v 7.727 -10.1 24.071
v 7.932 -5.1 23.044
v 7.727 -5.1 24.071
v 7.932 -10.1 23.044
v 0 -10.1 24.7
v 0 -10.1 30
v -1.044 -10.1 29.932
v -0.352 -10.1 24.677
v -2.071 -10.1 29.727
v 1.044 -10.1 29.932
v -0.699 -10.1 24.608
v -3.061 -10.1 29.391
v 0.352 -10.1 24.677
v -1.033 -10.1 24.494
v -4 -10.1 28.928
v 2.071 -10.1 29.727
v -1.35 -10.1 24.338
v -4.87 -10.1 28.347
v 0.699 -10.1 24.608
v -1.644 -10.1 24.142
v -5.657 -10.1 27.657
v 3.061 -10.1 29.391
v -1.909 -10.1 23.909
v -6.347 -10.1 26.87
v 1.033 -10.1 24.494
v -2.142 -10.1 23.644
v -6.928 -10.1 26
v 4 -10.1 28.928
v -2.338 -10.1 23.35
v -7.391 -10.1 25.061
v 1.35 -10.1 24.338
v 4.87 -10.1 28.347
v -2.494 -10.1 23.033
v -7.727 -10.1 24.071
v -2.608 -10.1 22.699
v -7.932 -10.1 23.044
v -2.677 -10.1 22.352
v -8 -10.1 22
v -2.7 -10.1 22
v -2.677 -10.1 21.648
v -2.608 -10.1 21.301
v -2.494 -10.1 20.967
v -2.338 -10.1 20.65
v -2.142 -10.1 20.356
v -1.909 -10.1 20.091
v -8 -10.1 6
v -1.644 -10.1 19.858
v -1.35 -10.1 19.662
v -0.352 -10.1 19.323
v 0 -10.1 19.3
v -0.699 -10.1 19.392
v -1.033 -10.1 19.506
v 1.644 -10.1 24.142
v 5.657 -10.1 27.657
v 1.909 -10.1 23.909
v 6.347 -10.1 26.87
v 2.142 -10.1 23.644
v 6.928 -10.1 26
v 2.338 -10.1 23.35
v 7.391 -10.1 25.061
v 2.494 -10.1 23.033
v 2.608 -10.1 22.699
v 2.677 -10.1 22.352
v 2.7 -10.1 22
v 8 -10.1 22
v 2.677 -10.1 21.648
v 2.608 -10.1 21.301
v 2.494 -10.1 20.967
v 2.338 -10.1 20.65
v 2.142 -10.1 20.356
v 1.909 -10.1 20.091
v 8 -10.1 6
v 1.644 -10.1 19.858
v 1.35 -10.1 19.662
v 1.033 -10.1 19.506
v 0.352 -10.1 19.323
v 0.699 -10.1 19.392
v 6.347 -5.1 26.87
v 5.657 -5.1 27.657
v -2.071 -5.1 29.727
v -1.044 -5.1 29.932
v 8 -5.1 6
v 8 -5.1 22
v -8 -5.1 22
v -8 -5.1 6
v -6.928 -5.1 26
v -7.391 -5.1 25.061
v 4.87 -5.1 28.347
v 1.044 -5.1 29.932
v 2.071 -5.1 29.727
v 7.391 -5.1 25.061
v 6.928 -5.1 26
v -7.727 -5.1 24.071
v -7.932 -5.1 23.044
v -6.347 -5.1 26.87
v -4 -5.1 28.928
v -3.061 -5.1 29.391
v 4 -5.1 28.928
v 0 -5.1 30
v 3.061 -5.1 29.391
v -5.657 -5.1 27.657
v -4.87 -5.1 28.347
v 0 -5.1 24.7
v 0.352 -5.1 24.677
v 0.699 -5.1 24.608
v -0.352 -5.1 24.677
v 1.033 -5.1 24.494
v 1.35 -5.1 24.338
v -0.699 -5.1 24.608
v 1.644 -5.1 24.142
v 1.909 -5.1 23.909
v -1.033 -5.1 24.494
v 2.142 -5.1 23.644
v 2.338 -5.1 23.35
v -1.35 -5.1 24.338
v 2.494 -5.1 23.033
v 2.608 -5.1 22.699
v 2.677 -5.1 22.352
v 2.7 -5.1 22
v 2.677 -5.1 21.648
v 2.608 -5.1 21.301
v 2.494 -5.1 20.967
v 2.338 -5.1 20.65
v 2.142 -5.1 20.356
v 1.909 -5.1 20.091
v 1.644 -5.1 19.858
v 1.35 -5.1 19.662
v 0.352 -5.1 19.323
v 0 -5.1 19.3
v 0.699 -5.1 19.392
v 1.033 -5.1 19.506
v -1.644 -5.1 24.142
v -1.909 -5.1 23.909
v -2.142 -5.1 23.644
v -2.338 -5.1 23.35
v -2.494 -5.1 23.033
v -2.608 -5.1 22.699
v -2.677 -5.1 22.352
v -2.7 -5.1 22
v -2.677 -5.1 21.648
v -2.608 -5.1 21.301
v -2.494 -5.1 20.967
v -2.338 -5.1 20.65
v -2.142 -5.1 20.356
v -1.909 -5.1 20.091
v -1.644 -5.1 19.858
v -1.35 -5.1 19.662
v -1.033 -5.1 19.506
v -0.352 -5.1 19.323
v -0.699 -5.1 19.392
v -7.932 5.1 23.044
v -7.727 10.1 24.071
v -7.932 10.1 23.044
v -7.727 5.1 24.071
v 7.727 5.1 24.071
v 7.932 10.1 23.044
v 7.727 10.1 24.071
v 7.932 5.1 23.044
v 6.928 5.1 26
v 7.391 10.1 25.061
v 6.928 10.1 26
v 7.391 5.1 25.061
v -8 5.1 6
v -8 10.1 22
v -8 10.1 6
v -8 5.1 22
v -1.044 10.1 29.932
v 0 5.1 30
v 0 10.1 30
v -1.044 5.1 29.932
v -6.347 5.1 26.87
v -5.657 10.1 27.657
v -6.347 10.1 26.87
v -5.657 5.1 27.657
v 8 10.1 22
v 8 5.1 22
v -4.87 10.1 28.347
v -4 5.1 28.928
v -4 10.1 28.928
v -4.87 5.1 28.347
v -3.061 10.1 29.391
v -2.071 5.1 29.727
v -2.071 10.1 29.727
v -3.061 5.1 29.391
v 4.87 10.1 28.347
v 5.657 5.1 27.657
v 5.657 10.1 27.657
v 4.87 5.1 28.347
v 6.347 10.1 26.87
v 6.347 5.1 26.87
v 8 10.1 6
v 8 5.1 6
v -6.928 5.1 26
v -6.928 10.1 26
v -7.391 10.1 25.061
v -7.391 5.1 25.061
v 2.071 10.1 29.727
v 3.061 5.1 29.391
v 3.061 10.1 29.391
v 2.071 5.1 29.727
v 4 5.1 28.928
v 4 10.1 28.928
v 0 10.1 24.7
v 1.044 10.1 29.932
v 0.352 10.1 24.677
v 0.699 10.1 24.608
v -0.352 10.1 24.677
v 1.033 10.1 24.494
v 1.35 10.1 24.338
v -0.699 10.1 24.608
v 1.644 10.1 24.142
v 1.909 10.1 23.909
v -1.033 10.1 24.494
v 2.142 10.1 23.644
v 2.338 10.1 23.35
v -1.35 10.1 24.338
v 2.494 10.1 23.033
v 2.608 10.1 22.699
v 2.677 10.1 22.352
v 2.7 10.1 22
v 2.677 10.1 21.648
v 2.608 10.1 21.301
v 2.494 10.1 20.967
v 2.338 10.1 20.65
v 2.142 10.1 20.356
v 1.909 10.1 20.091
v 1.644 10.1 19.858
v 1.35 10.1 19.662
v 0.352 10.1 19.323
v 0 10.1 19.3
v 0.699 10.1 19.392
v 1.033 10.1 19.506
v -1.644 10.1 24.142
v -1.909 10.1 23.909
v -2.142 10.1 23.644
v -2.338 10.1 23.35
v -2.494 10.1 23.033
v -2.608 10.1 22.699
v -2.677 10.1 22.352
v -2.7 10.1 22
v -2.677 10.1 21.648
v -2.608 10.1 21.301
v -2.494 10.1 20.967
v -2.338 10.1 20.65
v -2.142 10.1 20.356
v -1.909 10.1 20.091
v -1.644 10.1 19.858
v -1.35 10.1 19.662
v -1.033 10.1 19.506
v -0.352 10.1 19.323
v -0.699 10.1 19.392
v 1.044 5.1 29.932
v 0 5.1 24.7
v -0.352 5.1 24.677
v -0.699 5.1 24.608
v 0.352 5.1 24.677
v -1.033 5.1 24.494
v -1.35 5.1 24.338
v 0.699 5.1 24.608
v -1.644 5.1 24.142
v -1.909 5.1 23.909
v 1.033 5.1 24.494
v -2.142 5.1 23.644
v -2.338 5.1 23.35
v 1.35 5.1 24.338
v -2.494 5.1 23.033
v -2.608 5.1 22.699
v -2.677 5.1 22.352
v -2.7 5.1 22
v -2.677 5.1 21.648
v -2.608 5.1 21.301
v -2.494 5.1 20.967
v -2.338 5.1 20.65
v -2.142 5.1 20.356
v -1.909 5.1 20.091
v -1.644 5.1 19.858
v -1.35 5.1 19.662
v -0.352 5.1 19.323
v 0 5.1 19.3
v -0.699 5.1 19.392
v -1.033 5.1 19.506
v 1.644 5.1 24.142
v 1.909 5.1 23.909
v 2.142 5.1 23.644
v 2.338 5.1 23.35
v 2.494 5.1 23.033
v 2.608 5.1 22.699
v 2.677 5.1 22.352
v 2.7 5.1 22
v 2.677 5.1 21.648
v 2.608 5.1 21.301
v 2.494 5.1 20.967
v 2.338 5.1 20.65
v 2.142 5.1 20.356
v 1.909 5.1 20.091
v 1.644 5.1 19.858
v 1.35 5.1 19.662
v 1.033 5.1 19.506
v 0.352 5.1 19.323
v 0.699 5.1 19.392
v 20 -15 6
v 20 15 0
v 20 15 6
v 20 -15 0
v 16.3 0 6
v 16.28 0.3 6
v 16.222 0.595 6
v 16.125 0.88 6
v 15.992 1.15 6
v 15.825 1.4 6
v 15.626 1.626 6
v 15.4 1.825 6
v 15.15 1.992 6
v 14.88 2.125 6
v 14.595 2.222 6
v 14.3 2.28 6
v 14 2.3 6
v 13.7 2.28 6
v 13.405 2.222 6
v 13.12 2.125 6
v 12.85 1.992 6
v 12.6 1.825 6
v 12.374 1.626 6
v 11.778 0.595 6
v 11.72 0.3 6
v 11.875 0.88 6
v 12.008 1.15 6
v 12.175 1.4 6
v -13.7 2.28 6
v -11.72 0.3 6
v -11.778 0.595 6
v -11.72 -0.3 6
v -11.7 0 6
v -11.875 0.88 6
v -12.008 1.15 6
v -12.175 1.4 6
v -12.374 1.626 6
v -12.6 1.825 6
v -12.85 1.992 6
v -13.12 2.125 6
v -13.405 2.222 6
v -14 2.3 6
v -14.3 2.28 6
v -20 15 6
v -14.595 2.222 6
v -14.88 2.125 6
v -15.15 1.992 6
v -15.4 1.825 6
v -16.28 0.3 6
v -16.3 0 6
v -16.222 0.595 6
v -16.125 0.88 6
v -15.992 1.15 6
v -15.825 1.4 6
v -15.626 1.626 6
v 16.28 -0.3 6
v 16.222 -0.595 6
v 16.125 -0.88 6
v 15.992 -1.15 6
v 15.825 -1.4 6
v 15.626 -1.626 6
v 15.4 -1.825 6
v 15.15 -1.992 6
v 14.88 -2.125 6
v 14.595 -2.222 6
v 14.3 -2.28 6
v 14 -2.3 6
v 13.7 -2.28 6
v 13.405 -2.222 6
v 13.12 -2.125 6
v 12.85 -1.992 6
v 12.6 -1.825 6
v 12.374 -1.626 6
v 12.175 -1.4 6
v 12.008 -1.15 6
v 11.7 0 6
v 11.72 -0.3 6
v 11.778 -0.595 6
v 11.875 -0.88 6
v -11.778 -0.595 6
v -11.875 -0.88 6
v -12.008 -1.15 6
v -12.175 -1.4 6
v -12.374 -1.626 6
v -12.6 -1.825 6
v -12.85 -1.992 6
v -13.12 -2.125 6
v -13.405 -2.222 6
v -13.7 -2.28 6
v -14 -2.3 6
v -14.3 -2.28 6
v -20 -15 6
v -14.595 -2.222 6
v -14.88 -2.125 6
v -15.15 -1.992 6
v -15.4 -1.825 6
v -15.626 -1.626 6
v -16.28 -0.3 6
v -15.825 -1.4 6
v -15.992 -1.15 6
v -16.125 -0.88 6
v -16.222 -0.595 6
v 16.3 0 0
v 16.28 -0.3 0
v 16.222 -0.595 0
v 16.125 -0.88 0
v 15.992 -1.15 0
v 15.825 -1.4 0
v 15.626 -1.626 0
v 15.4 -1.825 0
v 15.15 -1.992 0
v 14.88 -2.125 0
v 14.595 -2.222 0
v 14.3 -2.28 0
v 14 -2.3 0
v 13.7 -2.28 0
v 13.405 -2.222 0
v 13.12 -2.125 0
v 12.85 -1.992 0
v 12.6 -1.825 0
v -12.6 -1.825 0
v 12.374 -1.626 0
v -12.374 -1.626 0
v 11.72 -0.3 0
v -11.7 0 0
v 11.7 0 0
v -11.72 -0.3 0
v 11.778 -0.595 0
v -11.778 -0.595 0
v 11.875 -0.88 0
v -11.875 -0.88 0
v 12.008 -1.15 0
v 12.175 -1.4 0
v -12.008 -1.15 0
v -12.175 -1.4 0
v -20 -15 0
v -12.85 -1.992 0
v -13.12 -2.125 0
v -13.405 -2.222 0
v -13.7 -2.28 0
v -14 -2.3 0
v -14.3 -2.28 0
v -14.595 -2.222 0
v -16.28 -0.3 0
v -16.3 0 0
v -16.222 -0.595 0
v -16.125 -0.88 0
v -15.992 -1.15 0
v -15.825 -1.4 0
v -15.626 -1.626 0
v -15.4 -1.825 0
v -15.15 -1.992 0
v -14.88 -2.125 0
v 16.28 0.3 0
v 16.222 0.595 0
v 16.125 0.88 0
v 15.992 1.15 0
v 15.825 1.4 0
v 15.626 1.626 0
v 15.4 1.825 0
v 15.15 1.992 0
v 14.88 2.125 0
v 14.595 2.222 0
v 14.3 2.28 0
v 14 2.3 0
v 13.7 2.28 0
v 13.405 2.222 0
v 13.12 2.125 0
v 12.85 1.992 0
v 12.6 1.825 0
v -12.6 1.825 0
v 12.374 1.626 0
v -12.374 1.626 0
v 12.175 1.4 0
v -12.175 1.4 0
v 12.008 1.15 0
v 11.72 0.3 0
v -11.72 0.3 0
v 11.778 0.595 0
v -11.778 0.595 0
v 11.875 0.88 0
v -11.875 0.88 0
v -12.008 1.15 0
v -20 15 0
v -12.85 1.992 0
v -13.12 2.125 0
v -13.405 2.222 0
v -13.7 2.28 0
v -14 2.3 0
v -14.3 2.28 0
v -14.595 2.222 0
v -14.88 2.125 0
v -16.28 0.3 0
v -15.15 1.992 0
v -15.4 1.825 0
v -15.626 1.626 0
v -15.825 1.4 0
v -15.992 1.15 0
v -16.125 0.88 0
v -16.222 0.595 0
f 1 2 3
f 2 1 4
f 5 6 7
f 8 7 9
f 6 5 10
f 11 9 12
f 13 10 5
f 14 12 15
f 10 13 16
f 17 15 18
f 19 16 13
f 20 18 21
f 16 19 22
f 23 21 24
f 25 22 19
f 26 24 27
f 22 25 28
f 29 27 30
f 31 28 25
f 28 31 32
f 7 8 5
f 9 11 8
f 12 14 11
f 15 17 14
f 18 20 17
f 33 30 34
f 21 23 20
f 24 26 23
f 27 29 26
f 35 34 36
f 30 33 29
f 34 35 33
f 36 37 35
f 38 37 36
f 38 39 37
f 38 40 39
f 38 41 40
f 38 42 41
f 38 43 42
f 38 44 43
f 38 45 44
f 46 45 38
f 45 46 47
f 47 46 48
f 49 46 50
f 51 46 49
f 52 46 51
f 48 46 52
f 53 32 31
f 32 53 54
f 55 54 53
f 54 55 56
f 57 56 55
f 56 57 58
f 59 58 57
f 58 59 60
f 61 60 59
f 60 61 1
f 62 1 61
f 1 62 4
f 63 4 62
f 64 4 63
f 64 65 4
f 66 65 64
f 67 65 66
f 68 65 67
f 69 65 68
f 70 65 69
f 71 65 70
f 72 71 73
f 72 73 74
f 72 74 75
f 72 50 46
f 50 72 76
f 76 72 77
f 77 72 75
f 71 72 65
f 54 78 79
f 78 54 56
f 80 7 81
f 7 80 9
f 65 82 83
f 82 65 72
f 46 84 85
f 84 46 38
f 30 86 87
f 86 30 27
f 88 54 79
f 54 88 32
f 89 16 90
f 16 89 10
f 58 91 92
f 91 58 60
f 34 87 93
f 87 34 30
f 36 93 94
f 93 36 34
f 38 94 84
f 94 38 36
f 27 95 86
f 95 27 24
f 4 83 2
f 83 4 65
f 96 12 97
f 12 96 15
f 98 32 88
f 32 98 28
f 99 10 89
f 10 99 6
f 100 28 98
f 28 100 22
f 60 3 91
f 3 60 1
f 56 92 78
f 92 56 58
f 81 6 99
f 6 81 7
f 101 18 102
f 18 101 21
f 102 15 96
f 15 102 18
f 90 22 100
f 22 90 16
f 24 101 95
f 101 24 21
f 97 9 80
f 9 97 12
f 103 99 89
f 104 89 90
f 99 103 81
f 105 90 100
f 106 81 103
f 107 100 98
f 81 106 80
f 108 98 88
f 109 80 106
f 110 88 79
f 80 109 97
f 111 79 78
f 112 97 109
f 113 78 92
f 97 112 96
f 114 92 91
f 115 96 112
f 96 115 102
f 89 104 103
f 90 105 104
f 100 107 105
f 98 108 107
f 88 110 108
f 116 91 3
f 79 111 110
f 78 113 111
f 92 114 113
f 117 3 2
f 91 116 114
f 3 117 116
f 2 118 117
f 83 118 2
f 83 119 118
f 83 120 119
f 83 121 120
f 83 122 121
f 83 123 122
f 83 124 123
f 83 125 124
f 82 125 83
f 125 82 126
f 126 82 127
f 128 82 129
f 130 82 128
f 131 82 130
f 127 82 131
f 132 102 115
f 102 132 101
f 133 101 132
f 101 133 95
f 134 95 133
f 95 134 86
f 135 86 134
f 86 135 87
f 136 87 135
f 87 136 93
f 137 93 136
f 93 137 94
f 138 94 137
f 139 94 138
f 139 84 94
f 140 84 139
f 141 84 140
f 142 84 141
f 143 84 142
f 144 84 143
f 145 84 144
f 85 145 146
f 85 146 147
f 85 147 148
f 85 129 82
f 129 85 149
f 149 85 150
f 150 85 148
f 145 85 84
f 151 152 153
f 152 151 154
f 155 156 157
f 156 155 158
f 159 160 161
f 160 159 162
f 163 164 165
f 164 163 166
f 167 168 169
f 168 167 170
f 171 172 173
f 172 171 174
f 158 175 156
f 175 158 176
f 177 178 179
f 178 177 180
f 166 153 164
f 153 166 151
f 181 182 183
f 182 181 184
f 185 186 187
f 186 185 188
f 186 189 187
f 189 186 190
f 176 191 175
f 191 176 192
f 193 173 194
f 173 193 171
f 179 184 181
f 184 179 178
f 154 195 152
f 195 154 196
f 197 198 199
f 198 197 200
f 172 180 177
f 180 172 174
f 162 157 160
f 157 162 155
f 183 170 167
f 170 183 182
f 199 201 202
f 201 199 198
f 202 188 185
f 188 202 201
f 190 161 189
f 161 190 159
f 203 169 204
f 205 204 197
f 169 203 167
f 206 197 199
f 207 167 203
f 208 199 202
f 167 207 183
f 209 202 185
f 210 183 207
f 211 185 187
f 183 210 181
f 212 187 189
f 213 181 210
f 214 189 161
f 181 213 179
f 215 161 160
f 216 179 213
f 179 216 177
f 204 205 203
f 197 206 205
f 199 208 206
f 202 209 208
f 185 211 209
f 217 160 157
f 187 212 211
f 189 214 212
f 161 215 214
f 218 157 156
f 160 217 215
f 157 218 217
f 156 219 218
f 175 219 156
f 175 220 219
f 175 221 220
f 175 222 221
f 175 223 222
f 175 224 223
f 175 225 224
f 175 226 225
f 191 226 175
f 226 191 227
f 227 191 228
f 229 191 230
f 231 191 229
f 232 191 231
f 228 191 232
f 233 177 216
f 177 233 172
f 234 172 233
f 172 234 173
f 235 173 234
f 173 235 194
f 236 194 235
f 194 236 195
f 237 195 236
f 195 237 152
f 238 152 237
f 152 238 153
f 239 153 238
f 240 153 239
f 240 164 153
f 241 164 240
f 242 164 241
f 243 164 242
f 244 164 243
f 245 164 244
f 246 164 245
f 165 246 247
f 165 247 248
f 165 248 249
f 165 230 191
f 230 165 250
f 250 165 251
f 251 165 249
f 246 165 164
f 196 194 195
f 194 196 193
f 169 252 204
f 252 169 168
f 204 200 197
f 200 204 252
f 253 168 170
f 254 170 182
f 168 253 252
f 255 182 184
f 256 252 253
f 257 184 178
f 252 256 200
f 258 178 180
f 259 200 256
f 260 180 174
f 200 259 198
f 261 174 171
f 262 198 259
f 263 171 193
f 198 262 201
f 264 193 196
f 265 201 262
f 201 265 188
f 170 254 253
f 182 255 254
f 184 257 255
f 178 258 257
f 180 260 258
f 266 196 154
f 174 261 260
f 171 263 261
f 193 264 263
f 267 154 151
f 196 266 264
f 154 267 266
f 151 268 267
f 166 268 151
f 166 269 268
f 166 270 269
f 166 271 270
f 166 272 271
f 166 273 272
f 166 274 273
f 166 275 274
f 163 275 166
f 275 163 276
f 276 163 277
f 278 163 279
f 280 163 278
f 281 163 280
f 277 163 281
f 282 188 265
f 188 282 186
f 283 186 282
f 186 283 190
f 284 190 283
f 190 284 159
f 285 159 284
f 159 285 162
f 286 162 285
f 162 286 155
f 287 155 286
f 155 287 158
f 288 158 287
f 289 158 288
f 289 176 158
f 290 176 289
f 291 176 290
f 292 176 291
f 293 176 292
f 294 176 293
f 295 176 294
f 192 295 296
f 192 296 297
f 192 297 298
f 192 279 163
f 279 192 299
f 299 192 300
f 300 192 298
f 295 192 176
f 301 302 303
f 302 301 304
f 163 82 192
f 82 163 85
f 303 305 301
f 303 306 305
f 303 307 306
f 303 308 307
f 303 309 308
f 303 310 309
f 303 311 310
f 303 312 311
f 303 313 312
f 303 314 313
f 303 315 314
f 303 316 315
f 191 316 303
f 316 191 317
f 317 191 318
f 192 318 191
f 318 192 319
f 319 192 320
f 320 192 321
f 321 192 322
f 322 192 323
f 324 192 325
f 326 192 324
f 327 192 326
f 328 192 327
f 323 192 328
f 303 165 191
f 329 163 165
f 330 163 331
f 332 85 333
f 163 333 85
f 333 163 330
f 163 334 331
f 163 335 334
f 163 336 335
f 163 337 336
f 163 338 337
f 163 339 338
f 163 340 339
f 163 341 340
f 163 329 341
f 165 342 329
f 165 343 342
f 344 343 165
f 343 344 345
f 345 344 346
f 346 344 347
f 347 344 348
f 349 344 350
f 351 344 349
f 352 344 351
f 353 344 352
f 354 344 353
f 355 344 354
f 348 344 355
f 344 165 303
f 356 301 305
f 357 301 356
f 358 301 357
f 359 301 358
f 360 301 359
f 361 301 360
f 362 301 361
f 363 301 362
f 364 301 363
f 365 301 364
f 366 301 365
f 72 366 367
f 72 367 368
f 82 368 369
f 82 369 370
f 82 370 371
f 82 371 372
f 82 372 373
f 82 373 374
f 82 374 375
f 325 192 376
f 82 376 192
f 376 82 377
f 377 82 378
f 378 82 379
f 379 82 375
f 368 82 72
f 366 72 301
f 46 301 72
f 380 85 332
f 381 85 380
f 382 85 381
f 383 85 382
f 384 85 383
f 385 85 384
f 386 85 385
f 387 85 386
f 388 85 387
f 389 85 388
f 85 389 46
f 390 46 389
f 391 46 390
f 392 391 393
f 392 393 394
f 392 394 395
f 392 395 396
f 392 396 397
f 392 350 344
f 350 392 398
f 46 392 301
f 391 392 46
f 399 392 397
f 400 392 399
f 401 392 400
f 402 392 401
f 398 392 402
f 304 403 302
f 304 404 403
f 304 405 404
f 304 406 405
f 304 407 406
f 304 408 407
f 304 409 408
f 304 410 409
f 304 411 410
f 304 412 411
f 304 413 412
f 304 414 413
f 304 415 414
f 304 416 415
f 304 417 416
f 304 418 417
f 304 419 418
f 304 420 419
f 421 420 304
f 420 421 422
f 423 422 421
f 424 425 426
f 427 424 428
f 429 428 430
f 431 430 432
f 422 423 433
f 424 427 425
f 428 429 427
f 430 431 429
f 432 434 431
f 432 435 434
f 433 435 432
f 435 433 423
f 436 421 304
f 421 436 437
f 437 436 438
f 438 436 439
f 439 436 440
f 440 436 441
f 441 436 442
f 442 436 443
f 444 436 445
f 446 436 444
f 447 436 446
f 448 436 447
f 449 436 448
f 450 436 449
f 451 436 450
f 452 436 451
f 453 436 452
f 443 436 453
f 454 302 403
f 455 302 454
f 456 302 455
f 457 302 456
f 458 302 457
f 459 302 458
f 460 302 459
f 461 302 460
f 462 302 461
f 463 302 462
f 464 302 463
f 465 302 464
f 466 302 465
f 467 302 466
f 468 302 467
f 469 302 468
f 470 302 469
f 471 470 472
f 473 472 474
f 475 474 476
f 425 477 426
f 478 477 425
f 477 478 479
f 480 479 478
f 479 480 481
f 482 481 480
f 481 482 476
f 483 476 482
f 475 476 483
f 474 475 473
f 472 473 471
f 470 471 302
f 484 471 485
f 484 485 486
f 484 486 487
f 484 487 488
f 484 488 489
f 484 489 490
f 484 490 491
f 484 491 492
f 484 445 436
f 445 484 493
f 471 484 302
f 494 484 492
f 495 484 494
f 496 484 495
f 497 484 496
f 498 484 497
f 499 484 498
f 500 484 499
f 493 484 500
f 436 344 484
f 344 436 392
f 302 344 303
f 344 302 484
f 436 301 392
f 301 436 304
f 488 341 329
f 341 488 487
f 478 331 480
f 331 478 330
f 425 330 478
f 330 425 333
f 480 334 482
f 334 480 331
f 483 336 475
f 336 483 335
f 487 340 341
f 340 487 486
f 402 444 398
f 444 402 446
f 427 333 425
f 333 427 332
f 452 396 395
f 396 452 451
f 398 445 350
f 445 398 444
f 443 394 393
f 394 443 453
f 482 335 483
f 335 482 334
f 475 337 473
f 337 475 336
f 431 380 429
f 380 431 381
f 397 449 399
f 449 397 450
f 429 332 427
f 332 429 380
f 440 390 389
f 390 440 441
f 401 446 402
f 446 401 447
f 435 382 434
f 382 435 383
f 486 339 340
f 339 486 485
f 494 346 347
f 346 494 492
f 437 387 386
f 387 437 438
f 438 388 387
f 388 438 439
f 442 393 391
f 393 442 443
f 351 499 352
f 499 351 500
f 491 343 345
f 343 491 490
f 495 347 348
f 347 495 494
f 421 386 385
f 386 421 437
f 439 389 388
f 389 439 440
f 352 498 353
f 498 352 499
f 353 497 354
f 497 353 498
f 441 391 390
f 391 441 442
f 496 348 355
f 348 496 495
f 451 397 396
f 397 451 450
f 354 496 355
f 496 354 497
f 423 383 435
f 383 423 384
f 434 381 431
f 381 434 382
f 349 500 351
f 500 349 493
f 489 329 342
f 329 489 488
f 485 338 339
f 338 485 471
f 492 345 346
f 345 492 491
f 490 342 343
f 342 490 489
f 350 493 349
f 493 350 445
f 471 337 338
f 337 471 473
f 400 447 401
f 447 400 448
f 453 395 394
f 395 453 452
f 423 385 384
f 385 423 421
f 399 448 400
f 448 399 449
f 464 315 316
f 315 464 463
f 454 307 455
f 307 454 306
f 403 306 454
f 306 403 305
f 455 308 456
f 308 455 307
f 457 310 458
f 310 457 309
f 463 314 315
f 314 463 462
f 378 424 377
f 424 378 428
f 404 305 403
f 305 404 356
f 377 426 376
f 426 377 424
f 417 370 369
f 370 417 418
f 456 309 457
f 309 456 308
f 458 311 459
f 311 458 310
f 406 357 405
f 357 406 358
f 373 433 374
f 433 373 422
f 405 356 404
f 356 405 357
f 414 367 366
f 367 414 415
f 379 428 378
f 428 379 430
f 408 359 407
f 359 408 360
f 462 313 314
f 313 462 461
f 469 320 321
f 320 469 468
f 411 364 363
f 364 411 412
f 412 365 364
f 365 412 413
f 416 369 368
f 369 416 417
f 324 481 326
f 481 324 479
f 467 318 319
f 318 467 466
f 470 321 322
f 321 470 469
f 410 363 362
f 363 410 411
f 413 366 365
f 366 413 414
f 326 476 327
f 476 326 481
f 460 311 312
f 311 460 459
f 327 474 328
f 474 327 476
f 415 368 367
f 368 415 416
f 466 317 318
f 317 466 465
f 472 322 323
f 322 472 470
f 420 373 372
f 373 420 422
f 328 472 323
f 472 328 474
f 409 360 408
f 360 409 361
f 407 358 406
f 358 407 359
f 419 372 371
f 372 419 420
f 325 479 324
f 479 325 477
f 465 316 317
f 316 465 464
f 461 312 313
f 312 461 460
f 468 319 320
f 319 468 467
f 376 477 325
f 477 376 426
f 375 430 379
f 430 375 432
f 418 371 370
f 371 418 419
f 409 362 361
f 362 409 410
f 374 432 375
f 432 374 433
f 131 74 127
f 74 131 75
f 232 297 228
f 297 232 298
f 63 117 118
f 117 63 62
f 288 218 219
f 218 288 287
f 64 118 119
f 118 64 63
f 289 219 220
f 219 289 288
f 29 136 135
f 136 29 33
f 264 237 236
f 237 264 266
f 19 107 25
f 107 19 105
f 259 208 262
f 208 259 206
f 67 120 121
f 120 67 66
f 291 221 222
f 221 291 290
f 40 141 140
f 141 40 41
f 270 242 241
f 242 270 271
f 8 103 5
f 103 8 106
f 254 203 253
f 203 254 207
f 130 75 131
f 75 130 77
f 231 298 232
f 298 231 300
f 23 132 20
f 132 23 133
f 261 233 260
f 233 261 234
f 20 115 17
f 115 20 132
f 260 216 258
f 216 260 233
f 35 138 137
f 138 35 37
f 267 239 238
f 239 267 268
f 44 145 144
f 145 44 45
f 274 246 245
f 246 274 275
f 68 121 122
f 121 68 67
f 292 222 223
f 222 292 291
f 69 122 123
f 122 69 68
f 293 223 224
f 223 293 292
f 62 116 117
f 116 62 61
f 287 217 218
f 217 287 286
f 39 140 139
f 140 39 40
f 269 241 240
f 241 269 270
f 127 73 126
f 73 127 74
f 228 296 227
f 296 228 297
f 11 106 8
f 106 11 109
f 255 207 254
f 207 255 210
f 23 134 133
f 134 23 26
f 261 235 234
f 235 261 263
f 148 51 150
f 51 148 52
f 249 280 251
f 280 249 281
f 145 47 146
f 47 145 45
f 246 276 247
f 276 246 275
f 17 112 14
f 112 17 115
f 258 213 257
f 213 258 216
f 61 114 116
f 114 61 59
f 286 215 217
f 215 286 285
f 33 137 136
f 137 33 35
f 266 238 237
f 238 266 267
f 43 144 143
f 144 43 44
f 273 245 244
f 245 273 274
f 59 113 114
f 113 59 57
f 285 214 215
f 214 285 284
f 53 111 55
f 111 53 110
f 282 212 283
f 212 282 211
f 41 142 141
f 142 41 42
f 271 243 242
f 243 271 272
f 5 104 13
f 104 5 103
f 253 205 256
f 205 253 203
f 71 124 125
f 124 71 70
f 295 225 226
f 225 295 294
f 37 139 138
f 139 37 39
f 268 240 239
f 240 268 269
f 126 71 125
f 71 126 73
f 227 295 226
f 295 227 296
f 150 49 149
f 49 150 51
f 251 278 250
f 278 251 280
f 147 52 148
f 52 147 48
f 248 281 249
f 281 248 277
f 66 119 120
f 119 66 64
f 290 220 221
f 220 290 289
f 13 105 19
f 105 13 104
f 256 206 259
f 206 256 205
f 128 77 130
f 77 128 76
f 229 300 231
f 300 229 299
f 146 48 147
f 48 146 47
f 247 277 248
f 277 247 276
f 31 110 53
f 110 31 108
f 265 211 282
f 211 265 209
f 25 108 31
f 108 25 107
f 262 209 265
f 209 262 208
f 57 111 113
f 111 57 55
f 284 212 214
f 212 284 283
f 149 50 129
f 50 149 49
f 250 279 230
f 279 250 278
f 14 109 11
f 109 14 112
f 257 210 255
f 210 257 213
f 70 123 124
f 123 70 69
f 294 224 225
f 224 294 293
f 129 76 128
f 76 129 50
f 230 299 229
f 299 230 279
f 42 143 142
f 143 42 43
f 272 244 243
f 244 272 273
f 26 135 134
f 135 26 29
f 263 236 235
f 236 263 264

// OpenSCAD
// PETAL support fittings, mm. Smooth 1/4 inch (6.35 mm) metal rod.
// Positive Z points from a rod-end pivot into its rod socket.
part="clevis"; // [clevis,rod-end,carrier-3,carrier-4]
$fn=48;
module bore_y(d,h){rotate([90,0,0]) cylinder(d=d,h=h,center=true);}
module clevis(){difference(){union(){translate([-20,-15,0])cube([40,30,6]);for(y=[-7.6,7.6])hull(){translate([-8,y-2.5,5])cube([16,5,1]);translate([0,y,22])bore_y(16,5);}}for(x=[-14,14])translate([x,0,-1])cylinder(d=4.6,h=9);translate([0,0,22])bore_y(5.4,40);}}
module rod_end(){difference(){union(){hull(){bore_y(18,9.6);translate([-6,-4.8,9])cube([12,9.6,8]);}translate([0,0,16])cylinder(d=16,h=28);translate([6,-7,27])cube([13,14,10]);}bore_y(5.4,25);translate([0,0,16])cylinder(d=6.7,h=30);translate([0,-.6,22])cube([22,1.2,24]);translate([12,0,32])bore_y(4.5,22);translate([12,7.01,32])rotate([90,0,0])cylinder(d=7.5/cos(30),h=3.3,$fn=6);}}
module carrier(n){difference(){union(){cylinder(d=80,h=6);for(a=[0:360/n:359])rotate([0,0,a])translate([27,-15,0])cube([60,30,6]);}translate([0,0,-1])cylinder(d=40,h=8);for(a=[0:360/n:359])rotate([0,0,a])for(r=[51,79])translate([r,0,-1])cylinder(d=4.6,h=8);for(a=[45:90:359])rotate([0,0,a])translate([28,0,-1])cylinder(d=4.6,h=8);}}
if(part=="clevis")clevis();
if(part=="rod-end")rod_end();
if(part=="carrier-3")carrier(3);
if(part=="carrier-4")carrier(4);
